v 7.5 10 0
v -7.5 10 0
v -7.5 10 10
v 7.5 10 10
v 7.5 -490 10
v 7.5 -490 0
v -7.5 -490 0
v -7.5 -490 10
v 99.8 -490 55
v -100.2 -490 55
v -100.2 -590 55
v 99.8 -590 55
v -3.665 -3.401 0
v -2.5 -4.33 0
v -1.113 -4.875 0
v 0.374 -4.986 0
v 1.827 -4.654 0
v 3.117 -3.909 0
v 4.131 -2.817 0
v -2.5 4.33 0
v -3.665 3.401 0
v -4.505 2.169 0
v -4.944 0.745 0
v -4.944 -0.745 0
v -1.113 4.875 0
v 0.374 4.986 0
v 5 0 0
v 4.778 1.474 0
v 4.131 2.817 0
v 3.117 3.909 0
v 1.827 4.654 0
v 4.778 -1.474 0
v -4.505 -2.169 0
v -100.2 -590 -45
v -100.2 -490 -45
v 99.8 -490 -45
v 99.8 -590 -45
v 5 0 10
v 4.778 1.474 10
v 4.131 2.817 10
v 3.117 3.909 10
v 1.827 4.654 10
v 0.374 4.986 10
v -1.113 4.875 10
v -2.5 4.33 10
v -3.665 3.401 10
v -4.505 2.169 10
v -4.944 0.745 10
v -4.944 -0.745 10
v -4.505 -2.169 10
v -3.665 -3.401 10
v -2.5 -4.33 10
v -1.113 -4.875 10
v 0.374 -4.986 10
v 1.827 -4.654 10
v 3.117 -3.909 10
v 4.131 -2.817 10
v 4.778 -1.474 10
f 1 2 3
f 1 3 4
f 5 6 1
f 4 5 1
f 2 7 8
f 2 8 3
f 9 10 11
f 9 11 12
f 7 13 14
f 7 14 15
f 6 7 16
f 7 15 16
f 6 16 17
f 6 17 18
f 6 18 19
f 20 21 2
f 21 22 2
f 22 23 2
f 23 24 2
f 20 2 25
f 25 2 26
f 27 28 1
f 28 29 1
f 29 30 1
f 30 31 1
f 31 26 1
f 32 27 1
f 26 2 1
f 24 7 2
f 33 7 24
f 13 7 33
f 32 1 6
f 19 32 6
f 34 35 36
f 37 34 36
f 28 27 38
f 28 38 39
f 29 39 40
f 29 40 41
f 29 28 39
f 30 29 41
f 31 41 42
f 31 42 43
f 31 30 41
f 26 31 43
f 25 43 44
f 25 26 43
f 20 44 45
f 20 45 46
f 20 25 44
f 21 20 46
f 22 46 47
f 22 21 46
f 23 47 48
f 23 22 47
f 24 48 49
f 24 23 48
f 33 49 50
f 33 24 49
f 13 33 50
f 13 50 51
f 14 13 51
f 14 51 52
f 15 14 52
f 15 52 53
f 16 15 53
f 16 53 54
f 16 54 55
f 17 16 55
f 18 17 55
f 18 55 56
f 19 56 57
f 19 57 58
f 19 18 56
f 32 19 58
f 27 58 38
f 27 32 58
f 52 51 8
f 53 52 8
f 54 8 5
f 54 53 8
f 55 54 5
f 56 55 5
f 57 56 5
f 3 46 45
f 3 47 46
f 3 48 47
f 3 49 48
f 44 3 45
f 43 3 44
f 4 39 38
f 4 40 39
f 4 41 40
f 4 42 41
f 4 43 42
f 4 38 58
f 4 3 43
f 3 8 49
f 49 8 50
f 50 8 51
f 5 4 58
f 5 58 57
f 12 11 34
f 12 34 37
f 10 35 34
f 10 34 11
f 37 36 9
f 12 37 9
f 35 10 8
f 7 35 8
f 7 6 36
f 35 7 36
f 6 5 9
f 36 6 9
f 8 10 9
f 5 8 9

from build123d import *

# Parameters (mm, degrees)
SKETCH1_W           = 15
SKETCH1_H           = 500
SKETCH1_R           = 5
BOSS_EXTRUDE1_DEPTH = 10
SKETCH2_W           = 200
SKETCH2_H           = 100
BOSS_EXTRUDE2_DEPTH = 100


with BuildPart() as part:
    # Sketch1 → Boss-Extrude1 (new body)
    with BuildSketch(Plane.XY):
        with Locations((0, -240)):
            Rectangle(SKETCH1_W, SKETCH1_H)
        Circle(SKETCH1_R, mode=Mode.SUBTRACT)
    extrude(amount=BOSS_EXTRUDE1_DEPTH)

    # Sketch2 → Boss-Extrude2 (add)
    with BuildSketch(Plane.XZ.offset(490)):
        with Locations((-0.2, 5)):
            Rectangle(SKETCH2_W, SKETCH2_H)
    extrude(amount=BOSS_EXTRUDE2_DEPTH)


solid = part.part
